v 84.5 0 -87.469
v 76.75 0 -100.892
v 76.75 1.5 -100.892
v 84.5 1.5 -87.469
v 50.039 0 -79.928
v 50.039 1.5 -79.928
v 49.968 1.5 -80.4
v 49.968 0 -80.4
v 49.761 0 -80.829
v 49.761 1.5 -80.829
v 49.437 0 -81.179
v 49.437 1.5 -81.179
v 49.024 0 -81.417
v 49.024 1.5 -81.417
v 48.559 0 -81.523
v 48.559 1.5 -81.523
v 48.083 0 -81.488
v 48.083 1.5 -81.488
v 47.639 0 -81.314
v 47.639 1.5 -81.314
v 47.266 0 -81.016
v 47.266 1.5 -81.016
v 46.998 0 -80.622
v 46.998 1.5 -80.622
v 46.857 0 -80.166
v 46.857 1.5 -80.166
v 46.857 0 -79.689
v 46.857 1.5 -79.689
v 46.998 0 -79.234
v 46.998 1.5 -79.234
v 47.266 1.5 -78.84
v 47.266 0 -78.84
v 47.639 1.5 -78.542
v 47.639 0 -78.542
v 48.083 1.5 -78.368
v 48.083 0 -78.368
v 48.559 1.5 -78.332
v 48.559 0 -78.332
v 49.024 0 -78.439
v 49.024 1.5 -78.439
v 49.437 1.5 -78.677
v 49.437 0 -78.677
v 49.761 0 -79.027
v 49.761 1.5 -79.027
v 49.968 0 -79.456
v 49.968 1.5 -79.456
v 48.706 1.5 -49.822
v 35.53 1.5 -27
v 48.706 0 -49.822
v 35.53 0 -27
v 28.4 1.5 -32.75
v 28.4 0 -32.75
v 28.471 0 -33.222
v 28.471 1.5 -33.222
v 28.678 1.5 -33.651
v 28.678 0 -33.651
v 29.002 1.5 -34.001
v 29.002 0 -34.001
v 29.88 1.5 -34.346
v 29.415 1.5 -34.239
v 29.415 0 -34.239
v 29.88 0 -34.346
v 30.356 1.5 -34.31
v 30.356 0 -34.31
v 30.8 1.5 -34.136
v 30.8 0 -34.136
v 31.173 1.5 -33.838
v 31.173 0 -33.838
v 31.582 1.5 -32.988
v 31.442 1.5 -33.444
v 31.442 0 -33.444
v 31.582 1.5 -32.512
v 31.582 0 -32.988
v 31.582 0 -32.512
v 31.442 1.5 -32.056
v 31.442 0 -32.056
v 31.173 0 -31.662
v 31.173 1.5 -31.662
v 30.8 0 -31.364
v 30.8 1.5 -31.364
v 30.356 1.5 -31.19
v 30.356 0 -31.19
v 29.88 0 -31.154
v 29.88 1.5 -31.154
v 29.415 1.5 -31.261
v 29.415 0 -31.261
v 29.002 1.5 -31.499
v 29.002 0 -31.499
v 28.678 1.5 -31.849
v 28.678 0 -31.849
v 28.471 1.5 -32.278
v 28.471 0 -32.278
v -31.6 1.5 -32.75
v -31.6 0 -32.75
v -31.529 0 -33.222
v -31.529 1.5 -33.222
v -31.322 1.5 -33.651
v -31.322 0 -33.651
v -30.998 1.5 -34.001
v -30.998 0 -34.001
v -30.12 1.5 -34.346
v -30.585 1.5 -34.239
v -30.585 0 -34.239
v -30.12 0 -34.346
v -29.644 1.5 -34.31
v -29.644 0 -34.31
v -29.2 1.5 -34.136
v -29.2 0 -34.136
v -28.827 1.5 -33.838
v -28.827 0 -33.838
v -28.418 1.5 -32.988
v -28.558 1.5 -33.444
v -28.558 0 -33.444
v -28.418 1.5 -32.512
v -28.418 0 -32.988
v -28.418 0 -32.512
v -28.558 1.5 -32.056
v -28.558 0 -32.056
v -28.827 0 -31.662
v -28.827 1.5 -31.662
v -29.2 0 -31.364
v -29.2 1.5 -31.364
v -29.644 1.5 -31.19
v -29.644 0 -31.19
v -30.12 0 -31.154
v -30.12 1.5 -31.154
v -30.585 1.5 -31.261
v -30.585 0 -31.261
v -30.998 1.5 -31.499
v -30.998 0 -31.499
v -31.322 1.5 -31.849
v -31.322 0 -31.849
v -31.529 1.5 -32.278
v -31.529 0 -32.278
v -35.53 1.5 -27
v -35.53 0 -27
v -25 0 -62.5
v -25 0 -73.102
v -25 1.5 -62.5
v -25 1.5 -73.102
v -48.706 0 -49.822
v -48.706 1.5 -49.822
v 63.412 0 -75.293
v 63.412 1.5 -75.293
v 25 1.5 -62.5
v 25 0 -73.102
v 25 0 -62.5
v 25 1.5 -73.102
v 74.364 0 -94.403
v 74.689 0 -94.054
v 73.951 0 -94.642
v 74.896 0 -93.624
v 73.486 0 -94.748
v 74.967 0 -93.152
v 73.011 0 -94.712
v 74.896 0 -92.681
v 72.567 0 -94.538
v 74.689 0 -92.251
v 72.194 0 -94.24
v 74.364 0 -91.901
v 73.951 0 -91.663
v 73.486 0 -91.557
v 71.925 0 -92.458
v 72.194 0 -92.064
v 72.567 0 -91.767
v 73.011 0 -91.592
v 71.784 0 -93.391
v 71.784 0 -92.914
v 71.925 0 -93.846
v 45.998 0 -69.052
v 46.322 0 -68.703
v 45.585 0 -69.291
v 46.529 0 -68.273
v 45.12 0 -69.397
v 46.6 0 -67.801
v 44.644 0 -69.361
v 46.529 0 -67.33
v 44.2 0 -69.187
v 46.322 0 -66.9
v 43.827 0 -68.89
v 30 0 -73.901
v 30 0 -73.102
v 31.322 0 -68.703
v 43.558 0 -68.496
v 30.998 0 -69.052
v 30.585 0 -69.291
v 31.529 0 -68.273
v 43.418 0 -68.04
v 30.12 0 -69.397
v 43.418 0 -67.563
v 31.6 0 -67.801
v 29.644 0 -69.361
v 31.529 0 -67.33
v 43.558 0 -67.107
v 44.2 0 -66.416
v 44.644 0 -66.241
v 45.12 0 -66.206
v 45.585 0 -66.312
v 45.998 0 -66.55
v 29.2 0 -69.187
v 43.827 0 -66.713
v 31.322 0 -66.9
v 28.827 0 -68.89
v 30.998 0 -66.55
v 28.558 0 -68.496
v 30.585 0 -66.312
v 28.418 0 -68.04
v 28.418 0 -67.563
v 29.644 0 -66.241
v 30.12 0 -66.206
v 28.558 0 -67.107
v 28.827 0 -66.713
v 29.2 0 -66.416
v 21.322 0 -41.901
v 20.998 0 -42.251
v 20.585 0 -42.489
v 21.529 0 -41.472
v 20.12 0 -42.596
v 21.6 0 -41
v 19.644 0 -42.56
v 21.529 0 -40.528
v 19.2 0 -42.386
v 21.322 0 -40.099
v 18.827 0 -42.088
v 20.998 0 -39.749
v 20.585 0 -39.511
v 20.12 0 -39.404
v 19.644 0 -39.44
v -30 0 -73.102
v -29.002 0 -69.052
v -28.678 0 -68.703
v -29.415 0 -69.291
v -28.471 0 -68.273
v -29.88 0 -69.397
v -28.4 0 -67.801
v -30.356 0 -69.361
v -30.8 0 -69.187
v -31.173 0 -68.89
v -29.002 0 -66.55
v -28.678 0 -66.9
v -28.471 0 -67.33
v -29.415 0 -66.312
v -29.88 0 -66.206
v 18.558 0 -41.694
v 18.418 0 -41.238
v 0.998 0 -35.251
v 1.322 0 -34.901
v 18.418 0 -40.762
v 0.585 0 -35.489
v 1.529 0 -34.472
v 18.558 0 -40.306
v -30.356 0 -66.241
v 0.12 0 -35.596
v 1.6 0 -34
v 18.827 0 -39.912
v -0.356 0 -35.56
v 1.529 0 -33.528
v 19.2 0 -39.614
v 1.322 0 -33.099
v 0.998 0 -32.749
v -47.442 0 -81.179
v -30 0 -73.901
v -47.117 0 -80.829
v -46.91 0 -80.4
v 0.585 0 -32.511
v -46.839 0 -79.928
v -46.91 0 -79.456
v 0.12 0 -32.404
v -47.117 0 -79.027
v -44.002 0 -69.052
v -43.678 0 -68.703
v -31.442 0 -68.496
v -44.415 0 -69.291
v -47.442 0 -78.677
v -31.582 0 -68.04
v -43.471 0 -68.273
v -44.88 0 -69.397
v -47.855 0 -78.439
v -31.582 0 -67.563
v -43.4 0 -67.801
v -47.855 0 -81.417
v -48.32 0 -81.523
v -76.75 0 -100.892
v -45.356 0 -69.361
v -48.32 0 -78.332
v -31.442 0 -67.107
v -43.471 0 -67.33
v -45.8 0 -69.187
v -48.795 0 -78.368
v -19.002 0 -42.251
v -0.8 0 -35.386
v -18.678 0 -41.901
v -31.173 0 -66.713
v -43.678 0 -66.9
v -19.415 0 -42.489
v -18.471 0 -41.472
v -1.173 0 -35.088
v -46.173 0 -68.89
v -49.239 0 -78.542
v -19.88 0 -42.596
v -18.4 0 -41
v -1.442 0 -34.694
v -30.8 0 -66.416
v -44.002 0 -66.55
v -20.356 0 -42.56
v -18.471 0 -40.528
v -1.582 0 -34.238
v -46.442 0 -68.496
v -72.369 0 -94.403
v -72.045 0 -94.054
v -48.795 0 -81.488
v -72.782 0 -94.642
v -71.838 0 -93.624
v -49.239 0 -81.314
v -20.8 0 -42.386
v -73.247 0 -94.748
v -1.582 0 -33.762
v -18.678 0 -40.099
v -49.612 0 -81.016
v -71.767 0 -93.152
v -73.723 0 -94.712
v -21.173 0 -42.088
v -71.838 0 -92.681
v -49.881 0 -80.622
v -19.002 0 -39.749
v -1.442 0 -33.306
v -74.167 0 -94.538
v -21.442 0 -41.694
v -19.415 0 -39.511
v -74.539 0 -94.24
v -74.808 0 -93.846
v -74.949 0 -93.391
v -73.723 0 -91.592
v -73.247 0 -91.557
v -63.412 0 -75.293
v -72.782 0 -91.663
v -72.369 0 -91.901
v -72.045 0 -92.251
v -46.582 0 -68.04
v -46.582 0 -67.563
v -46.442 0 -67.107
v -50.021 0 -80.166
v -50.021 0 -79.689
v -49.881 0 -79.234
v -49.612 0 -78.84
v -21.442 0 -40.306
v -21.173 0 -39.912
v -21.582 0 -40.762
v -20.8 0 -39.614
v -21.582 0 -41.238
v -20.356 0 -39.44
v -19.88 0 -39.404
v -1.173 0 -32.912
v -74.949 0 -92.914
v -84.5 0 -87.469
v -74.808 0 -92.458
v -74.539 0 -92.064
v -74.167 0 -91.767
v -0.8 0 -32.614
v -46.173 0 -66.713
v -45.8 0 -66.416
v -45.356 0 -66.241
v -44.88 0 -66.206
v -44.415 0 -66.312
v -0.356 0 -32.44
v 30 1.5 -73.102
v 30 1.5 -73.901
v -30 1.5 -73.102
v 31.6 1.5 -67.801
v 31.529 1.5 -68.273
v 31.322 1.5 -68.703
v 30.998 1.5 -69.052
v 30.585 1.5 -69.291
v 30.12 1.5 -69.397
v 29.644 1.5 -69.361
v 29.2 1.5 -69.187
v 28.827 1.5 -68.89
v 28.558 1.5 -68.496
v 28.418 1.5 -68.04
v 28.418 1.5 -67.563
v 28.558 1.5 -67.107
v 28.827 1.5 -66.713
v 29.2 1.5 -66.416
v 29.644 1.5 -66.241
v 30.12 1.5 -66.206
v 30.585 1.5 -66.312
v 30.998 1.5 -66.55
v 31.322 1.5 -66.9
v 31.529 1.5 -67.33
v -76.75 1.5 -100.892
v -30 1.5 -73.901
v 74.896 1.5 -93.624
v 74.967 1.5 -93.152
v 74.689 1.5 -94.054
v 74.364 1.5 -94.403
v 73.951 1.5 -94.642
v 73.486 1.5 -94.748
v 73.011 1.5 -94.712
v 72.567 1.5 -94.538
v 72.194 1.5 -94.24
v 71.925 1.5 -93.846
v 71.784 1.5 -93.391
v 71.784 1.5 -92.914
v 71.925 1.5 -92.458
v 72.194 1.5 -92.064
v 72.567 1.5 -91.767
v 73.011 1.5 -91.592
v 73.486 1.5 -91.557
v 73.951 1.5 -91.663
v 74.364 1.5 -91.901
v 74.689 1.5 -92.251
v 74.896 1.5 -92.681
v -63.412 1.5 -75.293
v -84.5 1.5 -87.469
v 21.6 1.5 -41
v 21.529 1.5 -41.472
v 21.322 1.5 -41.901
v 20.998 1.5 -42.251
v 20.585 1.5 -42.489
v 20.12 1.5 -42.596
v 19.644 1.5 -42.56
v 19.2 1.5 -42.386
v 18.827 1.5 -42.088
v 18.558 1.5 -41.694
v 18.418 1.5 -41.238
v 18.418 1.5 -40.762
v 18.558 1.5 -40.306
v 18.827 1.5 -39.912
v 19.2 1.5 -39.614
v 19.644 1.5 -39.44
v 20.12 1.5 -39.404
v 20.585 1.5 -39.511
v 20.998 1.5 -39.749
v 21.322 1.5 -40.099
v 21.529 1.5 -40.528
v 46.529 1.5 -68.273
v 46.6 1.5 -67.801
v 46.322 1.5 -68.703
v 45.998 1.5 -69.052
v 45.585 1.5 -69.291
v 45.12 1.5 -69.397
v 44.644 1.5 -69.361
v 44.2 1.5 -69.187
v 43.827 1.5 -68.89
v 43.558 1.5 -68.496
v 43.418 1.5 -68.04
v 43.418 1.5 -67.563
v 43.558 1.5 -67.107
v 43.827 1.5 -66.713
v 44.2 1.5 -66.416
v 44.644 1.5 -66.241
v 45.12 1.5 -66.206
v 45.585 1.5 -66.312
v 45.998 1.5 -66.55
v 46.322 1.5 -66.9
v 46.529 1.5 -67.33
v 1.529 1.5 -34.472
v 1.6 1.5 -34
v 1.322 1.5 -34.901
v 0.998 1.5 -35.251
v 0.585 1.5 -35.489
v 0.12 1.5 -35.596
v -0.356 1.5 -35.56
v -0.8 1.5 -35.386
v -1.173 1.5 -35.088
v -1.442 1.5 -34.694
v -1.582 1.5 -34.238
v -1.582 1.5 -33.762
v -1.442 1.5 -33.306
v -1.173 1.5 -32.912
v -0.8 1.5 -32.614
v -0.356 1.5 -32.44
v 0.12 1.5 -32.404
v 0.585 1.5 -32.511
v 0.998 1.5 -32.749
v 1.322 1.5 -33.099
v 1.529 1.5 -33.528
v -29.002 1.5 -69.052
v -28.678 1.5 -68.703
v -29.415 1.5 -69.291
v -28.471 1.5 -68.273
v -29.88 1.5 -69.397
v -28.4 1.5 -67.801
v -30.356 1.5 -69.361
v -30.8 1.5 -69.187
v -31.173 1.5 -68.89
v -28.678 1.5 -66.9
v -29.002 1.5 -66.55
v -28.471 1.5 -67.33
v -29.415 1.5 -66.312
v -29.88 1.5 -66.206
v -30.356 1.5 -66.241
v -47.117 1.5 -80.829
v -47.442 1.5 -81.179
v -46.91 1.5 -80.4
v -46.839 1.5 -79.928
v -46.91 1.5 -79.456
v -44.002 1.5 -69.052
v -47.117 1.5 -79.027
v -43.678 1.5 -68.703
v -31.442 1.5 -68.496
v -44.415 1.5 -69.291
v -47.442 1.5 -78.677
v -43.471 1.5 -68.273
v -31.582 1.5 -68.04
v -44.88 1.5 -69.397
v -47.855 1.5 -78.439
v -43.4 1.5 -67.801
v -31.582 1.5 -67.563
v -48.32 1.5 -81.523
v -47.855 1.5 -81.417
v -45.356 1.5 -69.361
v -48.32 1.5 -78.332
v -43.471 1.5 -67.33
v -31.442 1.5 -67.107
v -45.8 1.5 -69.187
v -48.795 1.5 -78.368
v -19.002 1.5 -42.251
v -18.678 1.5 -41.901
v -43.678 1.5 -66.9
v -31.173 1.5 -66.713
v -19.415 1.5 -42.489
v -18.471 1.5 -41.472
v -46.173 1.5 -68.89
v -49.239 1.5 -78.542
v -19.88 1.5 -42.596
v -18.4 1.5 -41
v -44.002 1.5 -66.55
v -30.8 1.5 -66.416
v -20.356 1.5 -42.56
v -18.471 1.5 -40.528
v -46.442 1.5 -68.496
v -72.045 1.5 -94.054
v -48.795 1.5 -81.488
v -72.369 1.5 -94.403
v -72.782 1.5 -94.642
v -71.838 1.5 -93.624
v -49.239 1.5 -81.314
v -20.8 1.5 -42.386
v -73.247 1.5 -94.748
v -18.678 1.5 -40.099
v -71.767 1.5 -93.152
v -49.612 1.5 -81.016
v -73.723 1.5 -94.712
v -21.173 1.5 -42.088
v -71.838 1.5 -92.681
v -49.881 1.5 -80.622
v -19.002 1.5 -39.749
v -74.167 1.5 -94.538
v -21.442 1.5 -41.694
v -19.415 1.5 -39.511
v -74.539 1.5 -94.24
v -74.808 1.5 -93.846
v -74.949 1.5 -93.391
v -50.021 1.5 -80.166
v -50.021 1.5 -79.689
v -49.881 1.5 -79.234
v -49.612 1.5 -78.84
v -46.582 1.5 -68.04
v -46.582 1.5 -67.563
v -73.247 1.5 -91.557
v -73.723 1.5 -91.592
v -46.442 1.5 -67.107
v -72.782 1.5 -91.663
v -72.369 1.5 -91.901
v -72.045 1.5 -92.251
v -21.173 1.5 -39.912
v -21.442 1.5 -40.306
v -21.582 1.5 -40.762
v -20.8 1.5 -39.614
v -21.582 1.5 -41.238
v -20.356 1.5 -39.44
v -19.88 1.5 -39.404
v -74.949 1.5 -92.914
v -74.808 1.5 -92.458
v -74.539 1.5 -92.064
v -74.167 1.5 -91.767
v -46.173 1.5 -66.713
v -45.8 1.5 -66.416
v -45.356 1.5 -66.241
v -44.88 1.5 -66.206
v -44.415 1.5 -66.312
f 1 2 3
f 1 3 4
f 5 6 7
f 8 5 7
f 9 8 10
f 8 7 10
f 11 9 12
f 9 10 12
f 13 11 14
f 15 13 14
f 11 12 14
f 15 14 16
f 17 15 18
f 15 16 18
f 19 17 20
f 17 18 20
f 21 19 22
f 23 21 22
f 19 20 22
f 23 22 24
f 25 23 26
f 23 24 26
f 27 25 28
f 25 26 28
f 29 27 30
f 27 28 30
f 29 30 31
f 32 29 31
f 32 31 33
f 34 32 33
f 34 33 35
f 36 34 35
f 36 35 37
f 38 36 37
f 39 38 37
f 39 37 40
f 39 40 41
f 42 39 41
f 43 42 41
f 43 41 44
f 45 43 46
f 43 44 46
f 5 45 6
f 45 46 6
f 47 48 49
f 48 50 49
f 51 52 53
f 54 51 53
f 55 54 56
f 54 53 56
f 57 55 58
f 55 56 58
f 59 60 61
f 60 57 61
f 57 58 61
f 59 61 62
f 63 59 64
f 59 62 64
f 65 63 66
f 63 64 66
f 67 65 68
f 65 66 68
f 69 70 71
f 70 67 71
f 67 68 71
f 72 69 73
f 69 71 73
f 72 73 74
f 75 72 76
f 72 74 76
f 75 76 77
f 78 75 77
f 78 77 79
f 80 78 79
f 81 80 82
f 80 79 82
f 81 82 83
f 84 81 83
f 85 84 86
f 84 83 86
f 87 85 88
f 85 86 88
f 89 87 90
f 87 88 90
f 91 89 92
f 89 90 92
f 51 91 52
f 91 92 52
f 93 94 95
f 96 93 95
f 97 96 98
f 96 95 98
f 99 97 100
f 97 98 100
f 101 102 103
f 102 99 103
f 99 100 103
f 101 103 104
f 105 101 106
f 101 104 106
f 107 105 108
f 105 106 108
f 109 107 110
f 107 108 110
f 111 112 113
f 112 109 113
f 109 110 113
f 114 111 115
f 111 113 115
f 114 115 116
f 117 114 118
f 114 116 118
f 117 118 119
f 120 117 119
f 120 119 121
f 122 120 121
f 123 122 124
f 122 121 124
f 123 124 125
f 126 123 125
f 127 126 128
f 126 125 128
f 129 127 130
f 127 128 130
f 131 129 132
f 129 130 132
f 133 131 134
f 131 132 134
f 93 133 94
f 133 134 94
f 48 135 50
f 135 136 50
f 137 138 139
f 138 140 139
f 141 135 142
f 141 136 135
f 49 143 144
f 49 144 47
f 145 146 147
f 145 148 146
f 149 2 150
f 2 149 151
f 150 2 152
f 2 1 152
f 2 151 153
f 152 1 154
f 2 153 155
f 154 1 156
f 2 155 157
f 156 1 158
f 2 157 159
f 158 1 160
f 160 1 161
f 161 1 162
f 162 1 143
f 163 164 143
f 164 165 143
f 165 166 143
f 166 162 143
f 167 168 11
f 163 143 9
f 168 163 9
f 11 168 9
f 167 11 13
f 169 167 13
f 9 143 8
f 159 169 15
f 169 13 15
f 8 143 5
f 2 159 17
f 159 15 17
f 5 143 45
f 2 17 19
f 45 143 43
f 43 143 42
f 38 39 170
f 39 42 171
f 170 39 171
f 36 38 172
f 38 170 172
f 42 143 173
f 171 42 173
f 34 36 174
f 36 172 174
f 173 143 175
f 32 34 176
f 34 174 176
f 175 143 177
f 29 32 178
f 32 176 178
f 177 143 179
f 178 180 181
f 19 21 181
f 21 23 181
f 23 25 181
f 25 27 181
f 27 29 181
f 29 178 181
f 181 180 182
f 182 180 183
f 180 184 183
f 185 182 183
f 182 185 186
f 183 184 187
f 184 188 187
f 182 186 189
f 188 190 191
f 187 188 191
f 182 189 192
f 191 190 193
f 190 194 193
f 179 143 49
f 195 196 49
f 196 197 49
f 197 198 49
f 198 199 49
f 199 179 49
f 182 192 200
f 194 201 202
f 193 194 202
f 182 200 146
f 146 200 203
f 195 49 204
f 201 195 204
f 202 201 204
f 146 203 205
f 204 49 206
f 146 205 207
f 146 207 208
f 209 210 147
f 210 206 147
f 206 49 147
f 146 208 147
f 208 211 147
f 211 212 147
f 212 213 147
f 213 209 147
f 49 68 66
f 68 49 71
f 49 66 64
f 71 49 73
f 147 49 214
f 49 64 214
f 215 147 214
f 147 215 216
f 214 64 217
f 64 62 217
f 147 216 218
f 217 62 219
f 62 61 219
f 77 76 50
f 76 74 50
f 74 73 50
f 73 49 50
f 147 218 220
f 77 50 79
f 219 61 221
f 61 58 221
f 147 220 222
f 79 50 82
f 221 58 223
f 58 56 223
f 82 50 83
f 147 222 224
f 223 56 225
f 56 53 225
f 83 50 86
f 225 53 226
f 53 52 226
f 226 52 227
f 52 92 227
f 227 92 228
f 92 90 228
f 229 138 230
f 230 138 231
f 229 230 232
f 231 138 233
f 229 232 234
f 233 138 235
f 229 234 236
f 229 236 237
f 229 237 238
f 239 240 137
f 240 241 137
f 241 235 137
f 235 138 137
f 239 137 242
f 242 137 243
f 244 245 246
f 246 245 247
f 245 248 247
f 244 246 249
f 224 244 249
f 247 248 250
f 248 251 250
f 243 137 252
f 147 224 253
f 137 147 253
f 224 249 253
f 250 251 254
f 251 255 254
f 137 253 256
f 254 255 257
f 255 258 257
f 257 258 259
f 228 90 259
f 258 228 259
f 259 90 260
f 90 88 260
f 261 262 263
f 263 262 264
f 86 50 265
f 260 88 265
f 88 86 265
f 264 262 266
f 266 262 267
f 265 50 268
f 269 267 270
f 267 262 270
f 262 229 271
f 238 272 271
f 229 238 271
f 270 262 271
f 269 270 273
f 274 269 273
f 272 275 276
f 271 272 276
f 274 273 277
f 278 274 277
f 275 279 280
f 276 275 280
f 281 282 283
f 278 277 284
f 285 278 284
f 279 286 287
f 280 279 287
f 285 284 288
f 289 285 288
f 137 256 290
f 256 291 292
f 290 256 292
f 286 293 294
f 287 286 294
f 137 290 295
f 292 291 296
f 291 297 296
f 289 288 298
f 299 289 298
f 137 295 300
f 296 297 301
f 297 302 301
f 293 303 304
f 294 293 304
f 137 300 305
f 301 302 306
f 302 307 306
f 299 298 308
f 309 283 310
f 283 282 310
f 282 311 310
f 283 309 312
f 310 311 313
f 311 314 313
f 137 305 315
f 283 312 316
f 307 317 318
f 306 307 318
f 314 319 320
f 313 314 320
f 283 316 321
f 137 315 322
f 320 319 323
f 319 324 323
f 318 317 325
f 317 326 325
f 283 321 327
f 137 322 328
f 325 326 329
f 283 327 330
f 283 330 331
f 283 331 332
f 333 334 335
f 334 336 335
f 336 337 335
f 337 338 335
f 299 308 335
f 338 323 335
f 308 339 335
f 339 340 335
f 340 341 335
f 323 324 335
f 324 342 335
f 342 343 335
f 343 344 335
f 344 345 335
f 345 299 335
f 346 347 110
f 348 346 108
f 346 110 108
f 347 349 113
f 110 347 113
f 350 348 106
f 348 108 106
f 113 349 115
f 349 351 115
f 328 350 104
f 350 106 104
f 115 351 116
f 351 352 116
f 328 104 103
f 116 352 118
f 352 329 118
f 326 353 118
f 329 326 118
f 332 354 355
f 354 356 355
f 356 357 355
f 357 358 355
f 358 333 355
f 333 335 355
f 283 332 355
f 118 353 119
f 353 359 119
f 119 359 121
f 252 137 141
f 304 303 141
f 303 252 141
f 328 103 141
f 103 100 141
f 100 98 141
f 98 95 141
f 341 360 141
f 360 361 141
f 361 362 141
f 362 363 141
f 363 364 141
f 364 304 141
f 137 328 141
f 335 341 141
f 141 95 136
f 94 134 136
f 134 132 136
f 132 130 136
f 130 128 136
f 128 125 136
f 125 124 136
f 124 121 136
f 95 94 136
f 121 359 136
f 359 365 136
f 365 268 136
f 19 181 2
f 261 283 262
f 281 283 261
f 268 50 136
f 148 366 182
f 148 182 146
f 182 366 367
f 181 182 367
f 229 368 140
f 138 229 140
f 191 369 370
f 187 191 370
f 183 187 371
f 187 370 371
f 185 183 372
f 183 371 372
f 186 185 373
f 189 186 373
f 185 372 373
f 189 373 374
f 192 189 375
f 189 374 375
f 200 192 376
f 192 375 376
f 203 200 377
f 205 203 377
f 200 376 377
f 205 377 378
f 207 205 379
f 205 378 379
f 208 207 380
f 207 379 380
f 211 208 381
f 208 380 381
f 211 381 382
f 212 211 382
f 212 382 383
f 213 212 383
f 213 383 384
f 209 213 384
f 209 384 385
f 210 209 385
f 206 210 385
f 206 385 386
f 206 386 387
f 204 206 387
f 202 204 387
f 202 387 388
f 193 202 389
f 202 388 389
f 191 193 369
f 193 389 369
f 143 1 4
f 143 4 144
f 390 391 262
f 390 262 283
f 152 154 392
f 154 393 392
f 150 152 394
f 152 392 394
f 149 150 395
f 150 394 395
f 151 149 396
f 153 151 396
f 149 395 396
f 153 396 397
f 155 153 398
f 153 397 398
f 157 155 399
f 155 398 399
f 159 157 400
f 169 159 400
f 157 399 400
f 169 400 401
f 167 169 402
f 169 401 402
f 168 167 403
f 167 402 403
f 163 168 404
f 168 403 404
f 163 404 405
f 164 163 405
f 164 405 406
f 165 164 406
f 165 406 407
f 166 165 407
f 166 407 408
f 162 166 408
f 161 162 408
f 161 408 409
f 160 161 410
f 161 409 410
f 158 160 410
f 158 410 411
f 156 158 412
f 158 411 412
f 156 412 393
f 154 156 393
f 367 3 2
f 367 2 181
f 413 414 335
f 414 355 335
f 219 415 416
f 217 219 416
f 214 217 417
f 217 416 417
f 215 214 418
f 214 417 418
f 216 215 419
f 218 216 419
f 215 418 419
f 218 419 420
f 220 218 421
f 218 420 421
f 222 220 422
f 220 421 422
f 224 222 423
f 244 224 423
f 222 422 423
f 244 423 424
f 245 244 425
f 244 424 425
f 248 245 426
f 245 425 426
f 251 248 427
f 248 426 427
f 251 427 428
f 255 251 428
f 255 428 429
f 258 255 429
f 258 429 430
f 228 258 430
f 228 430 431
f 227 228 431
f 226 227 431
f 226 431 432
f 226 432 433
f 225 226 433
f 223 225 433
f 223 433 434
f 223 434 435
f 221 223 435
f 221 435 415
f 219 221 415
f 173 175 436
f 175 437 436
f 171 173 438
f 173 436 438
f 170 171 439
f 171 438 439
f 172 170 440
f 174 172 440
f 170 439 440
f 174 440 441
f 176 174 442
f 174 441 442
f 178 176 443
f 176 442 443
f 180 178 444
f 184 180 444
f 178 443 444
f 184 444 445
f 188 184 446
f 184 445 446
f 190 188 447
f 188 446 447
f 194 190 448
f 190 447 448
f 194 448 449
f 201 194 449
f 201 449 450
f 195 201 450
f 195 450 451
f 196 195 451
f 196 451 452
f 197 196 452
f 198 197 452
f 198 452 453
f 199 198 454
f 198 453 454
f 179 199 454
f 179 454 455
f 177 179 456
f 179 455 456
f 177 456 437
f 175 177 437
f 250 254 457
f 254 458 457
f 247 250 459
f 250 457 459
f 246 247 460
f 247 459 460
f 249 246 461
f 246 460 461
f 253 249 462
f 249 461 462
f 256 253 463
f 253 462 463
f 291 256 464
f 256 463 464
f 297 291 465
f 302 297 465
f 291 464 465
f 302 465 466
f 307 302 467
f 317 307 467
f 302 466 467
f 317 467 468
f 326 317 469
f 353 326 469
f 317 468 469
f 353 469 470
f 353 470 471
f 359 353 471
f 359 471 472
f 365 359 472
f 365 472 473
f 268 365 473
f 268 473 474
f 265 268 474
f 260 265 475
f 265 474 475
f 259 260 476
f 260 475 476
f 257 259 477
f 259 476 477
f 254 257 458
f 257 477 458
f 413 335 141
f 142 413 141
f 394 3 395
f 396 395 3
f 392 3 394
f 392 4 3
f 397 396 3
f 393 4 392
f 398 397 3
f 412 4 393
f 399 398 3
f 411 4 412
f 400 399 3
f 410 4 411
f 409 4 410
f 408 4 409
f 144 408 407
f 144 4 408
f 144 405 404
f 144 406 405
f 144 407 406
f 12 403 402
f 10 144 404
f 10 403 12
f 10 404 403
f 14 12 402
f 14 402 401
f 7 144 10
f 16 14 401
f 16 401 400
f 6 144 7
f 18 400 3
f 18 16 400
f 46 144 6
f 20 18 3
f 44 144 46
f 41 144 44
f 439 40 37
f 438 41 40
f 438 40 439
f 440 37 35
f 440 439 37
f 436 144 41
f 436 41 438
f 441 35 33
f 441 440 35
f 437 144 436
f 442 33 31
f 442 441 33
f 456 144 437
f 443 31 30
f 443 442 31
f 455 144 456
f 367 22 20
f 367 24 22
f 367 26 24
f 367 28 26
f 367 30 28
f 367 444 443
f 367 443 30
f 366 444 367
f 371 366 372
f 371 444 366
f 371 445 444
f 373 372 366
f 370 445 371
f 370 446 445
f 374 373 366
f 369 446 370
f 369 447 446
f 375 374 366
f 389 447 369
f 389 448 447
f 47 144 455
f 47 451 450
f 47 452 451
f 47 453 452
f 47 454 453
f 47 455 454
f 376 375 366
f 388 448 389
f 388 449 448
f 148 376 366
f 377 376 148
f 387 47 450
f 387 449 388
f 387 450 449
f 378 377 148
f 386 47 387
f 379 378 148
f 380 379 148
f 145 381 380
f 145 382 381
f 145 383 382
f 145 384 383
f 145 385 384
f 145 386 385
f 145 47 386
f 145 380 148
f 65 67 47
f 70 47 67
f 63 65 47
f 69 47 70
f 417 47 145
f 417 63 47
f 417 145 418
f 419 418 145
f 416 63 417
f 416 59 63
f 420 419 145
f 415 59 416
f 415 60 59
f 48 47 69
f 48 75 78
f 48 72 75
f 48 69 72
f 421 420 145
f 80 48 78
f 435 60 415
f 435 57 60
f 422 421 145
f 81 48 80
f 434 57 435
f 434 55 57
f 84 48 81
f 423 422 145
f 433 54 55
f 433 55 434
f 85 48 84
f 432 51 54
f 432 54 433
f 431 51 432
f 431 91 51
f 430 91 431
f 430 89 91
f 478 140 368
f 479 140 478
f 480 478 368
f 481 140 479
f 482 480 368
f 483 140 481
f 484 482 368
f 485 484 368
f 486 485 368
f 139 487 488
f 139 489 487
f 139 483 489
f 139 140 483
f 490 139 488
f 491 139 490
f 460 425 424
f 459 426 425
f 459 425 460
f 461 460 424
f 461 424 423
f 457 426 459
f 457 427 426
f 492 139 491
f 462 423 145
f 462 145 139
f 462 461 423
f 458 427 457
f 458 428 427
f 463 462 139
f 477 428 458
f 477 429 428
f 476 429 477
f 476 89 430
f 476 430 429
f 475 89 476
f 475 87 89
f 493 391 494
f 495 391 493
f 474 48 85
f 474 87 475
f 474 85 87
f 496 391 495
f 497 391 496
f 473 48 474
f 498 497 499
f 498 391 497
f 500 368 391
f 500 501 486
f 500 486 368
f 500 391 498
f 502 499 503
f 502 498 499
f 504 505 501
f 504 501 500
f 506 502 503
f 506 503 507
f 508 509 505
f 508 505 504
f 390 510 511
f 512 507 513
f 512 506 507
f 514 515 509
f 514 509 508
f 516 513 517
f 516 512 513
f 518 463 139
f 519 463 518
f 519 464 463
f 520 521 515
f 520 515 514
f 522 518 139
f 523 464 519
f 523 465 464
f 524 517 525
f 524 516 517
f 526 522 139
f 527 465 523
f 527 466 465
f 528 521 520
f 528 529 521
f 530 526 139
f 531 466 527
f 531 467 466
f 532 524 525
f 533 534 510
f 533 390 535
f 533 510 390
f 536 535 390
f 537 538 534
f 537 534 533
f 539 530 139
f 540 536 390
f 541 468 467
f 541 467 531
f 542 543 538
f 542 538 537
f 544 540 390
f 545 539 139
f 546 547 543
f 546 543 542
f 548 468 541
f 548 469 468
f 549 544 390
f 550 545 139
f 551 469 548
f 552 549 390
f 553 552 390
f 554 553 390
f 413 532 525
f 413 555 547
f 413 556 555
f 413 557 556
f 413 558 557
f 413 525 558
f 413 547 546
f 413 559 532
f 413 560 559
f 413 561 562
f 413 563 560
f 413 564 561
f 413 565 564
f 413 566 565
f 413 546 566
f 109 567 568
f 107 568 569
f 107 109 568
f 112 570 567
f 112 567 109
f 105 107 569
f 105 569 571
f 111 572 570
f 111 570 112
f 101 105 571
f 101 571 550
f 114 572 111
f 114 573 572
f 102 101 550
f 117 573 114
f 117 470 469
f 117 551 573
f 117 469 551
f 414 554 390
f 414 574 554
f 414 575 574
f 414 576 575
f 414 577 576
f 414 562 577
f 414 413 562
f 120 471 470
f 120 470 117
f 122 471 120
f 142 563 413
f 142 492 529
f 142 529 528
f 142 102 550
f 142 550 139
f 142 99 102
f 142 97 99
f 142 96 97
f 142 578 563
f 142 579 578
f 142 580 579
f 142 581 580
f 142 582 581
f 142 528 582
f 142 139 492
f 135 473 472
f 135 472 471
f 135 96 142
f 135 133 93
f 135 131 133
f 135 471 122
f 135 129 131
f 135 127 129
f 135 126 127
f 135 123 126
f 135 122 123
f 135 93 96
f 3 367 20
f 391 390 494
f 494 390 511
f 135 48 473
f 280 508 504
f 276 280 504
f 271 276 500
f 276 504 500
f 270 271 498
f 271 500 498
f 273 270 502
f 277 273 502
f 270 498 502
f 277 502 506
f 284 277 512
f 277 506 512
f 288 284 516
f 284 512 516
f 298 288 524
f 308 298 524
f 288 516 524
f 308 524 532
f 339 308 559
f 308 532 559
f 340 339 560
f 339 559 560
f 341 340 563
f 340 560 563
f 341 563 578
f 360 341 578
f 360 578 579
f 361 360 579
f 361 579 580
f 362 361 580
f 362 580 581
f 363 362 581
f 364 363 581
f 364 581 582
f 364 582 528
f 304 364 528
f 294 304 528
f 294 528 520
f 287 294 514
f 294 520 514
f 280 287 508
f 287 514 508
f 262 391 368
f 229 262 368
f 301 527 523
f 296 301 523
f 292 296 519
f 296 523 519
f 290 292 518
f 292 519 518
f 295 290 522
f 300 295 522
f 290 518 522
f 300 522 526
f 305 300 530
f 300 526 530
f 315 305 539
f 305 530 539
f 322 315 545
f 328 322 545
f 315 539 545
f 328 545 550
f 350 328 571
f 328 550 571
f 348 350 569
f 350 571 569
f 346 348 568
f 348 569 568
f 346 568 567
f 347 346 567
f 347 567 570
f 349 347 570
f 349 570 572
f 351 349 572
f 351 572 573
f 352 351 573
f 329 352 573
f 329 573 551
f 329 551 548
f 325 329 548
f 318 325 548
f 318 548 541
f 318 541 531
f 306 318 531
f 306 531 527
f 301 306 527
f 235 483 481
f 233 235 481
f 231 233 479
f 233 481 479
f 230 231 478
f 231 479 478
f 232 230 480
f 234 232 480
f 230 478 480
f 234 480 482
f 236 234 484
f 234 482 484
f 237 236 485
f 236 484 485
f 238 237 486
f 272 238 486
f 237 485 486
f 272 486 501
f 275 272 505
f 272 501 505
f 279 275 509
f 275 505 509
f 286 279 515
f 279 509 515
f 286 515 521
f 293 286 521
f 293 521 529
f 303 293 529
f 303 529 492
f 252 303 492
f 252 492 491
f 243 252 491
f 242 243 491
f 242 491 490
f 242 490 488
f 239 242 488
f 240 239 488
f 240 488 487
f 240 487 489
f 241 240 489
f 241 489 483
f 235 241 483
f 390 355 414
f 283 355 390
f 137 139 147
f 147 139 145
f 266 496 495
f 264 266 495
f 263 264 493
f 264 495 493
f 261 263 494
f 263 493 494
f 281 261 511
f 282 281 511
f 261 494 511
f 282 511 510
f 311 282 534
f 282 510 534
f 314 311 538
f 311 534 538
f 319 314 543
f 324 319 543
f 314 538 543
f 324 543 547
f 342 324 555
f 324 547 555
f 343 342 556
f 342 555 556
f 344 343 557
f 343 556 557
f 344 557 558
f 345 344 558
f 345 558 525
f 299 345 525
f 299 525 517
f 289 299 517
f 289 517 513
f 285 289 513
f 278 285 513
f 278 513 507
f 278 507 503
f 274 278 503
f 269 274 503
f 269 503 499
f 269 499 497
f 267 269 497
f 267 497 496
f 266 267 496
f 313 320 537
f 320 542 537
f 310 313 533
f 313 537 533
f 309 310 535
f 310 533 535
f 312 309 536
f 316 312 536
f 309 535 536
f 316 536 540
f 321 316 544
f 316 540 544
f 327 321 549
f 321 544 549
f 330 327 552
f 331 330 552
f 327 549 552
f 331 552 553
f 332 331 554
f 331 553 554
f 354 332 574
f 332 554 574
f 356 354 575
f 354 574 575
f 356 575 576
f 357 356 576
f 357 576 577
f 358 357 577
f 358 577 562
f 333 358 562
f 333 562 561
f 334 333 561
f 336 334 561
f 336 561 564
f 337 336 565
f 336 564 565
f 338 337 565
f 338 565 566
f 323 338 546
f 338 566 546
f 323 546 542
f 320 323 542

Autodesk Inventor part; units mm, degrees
ref_plane "YZ Plane" through (0, 0, 0) normal (1, 0, 0) x (0, 1, 0)
ref_plane "XZ Plane" through (0, 0, 0) normal (0, 1, 0) x (-1, 0, 0)
ref_plane "XY Plane" through (0, 0, 0) normal (0, 0, 1) x (1, 0, 0)
sketch "スケッチ1" plane through (0, 0, 0) normal (0, 1, 0) x (-1, 0, 0)
  line L0 (75, 0) -> (105, -51.9615)
  line L1 (-75, 0) -> (-105, -51.9615)
  line L2 (0, -218.2384) -> (0, 36.3731)
  line L3 (147, 0) -> (-147, 0)
  line L4 (105, -51.9615) -> (30, -181.8653)
  line L5 (30, -181.8653) -> (-30, -181.8653)
  line L6 (-30, -181.8653) -> (-105, -51.9615)
  line L7 (75, 0) -> (-75, 0)
  line L8 (34, 0) -> (34, -24.3509)
  line L9 (34, -24.3509) -> (48.7058, -49.822)
  line L10 (48.7058, -49.822) -> (90, -25.9808)
  line L11 (45, 0) -> (45, -18) construction
  line L12 (45, -18) -> (34, -24.3509) construction
  line L13 (84.5, -87.4686) -> (63.4115, -75.2931)
  line L14 (63.4115, -75.2931) -> (48.7058, -49.822)
  line L15 (-34, 0) -> (-34, -24.3509)
  line L16 (-34, -24.3509) -> (-48.7058, -49.822)
  line L17 (-63.4115, -75.2931) -> (-48.7058, -49.822)
  line L18 (-84.5, -87.4686) -> (-63.4115, -75.2931)
  circle A0 centre (30, -32.75) radius 1.6
  circle A1 centre (-30, -32.75) radius 1.6
  line L19 (35.5295, -27) -> (-35.5295, -27)
  point P0 (0, 0)
  point P1 (0, 0)
  point P2 (0, -27)
  dimension "d1" = 150
  dimension "d2" = 60
  dimension "d3" = 60
  dimension "d6" = 60
  dimension "d30" = 60
  dimension "d31" = 18
  dimension "d32" = 30
  dimension "d33" = 41
  dimension "d34" = 3.2
  dimension "d35" = 30
  dimension "d36" = 32.75
  dimension "d37" = 27
extrude "プレート1" add sketch "スケッチ1" along normal blind 1.5 contours L14 L13 L4 L5 L2 L19 L9 | L2 L5 L6 L18 L17 L16 L19
sketch "スケッチ4" plane through (0, 1.5, 0) normal (0, 1, 0) x (1, 0, 0)
  circle A0 centre (30, 67.8013) radius 1.6
  circle A1 centre (45, 67.8013) radius 1.6
  line L0 (0, 218.2384) -> (0, -36.3731)
  circle A2 centre (-30, 67.8013) radius 1.6
  circle A3 centre (-45, 67.8013) radius 1.6
  line L1 (61.6173, 73.1025) -> (25, 73.1025)
  line L2 (25, 73.1025) -> (25, 62.5)
  line L3 (-61.6173, 73.1025) -> (-25, 73.1025)
  line L4 (-25, 73.1025) -> (-25, 62.5)
  line L5 (-25, 62.5) -> (25, 62.5)
  line L6 (-30, 73.1025) -> (30, 73.1025)
  line L7 (30, 73.1025) -> (30, 181.8653)
  line L8 (30, 181.8653) -> (-30, 181.8653)
  line L9 (-30, 181.8653) -> (-30, 73.1025)
  line L10 (-25, 62.5) -> (25, 62.5)
  line L11 (25, 62.5) -> (25, 73.1025)
  line L12 (25, 73.1025) -> (-25, 73.1025)
  line L13 (-25, 73.1025) -> (-25, 62.5)
  line L14 (30, 181.8653) -> (84.5, 87.4686)
  line L15 (76.75, 100.892) -> (30, 73.9008)
  line L16 (-30, 73.9008) -> (-76.75, 100.892)
  line L17 (-84.5, 87.4686) -> (-30, 181.8653)
  line L18 (84.5, 87.4686) -> (63.4115, 75.2931)
  line L19 (-63.4115, 75.2931) -> (-84.5, 87.4686)
  line L20 (-35.5295, 27) -> (-63.4115, 75.2931)
  line L21 (62.8673, 70.9375) -> (54.6673, 85.1403)
  arc A4 (54.6673, 85.1403) -> (44.275, 79.1403) centre (49.4712, 82.1403) ccw
  line L22 (44.275, 79.1403) -> (52.475, 64.9375)
  line L23 (52.475, 64.9375) -> (62.8673, 70.9375)
  line L24 (51.2321, 85.1903) -> (52.993, 82.1403)
  line L25 (52.993, 82.1403) -> (51.2321, 79.0903)
  line L26 (51.2321, 79.0903) -> (47.7102, 79.0903)
  line L27 (47.7102, 79.0903) -> (45.9493, 82.1403)
  line L28 (45.9493, 82.1403) -> (47.7102, 85.1903)
  line L29 (47.7102, 85.1903) -> (51.2321, 85.1903)
  point P0 (0, 0)
extrude "切り取り3" cut sketch "スケッチ4" against normal blind 1.5 contours A0 | A1 | L8 L7 L1 L6 L0 | L0 L6 L3 L9 L8 | L6 L2 L5 L0 | L0 L5 L4 L6 | L14 L15 A4 L7 | L9 L16 L17 | A4 L15 L29 L28 | L28 L29 L15 | A2 | A3
sketch "スケッチ5" plane through (0, 1.5, 0) normal (0, 1, 0) x (1, 0, 0)
  line L0 (-75, 44) -> (75, 44) projected
  circle A0 centre (-20, 41) radius 3
  circle A1 centre (20, 41) radius 3
  line L1 (-25, 62.5) -> (25, 62.5) projected
  line L2 (0, 62.5) -> (0, 27)
  line L3 (35.5295, 27) -> (-35.5295, 27) projected
  circle A2 centre (-20, 41) radius 1.6
  circle A3 centre (20, 41) radius 1.6
  circle A4 centre (0, 34) radius 1.6
  point P0 (0, 0)
  dimension "d41" = 6
  dimension "d42" = 6
  dimension "d43" = 40
  dimension "d44" = 3.2
  dimension "d45" = 3.2
  dimension "d46" = 3.2
  dimension "d47" = 7
extrude "切り取り4" cut sketch "スケッチ5" against normal blind 1.5 contours A4 L2 | L2 A4 | A2 | A3
sketch "スケッチ6" plane through (0, 1.5, 0) normal (0, 1, 0) x (1, 0, 0)
  ellipse E0 centre (-73.3666, 93.1522) end of major axis (-72.2841, 92.5272) minor radius 1.2133 projected
  circle A0 centre (-48.4391, 79.9279) radius 1.6
  circle A1 centre (-73.3666, 93.1522) radius 1.6
  line L0 (0, 0) -> (0, 20.4537)
  circle A2 centre (48.4391, 79.9279) radius 1.6
  circle A3 centre (73.3666, 93.1522) radius 1.6
  circle A4 centre (-48.4391, 79.9279) radius 1.35 projected
  dimension "d51" = 3.2
  dimension "d52" = 3.2
extrude "切り取り5" cut sketch "スケッチ6" against normal blind 1.5 contours E0 | A0 | A1 | A2 | A3 | A4
equation "\"d3\" = d2"
equation "\"d38\" = Thickness"
equation "\"d41\" = d42"
equation "\"d48\" = Thickness"
equation "\"d53\" = Thickness"
equation "\"d16\" = Thickness"
equation "\"BendRadius\" = Thickness"
equation "\"BendReliefWidth\" = Thickness"
equation "\"BendReliefDepth\" = 0.5 * Thickness"
equation "\"CornerReliefSize\" = 4 * Thickness"
equation "\"MinimumRemnant\" = 2 * Thickness"
equation "\"TransitionRadius\" = BendRadius"
equation "\"JacobiRadiusSize\" = BendRadius"
equation "\"GapSize\" = Thickness"
equation "\"Thickness\" = 1.5"
properties part number "upper_plate" material "アルミニウム 6061"
